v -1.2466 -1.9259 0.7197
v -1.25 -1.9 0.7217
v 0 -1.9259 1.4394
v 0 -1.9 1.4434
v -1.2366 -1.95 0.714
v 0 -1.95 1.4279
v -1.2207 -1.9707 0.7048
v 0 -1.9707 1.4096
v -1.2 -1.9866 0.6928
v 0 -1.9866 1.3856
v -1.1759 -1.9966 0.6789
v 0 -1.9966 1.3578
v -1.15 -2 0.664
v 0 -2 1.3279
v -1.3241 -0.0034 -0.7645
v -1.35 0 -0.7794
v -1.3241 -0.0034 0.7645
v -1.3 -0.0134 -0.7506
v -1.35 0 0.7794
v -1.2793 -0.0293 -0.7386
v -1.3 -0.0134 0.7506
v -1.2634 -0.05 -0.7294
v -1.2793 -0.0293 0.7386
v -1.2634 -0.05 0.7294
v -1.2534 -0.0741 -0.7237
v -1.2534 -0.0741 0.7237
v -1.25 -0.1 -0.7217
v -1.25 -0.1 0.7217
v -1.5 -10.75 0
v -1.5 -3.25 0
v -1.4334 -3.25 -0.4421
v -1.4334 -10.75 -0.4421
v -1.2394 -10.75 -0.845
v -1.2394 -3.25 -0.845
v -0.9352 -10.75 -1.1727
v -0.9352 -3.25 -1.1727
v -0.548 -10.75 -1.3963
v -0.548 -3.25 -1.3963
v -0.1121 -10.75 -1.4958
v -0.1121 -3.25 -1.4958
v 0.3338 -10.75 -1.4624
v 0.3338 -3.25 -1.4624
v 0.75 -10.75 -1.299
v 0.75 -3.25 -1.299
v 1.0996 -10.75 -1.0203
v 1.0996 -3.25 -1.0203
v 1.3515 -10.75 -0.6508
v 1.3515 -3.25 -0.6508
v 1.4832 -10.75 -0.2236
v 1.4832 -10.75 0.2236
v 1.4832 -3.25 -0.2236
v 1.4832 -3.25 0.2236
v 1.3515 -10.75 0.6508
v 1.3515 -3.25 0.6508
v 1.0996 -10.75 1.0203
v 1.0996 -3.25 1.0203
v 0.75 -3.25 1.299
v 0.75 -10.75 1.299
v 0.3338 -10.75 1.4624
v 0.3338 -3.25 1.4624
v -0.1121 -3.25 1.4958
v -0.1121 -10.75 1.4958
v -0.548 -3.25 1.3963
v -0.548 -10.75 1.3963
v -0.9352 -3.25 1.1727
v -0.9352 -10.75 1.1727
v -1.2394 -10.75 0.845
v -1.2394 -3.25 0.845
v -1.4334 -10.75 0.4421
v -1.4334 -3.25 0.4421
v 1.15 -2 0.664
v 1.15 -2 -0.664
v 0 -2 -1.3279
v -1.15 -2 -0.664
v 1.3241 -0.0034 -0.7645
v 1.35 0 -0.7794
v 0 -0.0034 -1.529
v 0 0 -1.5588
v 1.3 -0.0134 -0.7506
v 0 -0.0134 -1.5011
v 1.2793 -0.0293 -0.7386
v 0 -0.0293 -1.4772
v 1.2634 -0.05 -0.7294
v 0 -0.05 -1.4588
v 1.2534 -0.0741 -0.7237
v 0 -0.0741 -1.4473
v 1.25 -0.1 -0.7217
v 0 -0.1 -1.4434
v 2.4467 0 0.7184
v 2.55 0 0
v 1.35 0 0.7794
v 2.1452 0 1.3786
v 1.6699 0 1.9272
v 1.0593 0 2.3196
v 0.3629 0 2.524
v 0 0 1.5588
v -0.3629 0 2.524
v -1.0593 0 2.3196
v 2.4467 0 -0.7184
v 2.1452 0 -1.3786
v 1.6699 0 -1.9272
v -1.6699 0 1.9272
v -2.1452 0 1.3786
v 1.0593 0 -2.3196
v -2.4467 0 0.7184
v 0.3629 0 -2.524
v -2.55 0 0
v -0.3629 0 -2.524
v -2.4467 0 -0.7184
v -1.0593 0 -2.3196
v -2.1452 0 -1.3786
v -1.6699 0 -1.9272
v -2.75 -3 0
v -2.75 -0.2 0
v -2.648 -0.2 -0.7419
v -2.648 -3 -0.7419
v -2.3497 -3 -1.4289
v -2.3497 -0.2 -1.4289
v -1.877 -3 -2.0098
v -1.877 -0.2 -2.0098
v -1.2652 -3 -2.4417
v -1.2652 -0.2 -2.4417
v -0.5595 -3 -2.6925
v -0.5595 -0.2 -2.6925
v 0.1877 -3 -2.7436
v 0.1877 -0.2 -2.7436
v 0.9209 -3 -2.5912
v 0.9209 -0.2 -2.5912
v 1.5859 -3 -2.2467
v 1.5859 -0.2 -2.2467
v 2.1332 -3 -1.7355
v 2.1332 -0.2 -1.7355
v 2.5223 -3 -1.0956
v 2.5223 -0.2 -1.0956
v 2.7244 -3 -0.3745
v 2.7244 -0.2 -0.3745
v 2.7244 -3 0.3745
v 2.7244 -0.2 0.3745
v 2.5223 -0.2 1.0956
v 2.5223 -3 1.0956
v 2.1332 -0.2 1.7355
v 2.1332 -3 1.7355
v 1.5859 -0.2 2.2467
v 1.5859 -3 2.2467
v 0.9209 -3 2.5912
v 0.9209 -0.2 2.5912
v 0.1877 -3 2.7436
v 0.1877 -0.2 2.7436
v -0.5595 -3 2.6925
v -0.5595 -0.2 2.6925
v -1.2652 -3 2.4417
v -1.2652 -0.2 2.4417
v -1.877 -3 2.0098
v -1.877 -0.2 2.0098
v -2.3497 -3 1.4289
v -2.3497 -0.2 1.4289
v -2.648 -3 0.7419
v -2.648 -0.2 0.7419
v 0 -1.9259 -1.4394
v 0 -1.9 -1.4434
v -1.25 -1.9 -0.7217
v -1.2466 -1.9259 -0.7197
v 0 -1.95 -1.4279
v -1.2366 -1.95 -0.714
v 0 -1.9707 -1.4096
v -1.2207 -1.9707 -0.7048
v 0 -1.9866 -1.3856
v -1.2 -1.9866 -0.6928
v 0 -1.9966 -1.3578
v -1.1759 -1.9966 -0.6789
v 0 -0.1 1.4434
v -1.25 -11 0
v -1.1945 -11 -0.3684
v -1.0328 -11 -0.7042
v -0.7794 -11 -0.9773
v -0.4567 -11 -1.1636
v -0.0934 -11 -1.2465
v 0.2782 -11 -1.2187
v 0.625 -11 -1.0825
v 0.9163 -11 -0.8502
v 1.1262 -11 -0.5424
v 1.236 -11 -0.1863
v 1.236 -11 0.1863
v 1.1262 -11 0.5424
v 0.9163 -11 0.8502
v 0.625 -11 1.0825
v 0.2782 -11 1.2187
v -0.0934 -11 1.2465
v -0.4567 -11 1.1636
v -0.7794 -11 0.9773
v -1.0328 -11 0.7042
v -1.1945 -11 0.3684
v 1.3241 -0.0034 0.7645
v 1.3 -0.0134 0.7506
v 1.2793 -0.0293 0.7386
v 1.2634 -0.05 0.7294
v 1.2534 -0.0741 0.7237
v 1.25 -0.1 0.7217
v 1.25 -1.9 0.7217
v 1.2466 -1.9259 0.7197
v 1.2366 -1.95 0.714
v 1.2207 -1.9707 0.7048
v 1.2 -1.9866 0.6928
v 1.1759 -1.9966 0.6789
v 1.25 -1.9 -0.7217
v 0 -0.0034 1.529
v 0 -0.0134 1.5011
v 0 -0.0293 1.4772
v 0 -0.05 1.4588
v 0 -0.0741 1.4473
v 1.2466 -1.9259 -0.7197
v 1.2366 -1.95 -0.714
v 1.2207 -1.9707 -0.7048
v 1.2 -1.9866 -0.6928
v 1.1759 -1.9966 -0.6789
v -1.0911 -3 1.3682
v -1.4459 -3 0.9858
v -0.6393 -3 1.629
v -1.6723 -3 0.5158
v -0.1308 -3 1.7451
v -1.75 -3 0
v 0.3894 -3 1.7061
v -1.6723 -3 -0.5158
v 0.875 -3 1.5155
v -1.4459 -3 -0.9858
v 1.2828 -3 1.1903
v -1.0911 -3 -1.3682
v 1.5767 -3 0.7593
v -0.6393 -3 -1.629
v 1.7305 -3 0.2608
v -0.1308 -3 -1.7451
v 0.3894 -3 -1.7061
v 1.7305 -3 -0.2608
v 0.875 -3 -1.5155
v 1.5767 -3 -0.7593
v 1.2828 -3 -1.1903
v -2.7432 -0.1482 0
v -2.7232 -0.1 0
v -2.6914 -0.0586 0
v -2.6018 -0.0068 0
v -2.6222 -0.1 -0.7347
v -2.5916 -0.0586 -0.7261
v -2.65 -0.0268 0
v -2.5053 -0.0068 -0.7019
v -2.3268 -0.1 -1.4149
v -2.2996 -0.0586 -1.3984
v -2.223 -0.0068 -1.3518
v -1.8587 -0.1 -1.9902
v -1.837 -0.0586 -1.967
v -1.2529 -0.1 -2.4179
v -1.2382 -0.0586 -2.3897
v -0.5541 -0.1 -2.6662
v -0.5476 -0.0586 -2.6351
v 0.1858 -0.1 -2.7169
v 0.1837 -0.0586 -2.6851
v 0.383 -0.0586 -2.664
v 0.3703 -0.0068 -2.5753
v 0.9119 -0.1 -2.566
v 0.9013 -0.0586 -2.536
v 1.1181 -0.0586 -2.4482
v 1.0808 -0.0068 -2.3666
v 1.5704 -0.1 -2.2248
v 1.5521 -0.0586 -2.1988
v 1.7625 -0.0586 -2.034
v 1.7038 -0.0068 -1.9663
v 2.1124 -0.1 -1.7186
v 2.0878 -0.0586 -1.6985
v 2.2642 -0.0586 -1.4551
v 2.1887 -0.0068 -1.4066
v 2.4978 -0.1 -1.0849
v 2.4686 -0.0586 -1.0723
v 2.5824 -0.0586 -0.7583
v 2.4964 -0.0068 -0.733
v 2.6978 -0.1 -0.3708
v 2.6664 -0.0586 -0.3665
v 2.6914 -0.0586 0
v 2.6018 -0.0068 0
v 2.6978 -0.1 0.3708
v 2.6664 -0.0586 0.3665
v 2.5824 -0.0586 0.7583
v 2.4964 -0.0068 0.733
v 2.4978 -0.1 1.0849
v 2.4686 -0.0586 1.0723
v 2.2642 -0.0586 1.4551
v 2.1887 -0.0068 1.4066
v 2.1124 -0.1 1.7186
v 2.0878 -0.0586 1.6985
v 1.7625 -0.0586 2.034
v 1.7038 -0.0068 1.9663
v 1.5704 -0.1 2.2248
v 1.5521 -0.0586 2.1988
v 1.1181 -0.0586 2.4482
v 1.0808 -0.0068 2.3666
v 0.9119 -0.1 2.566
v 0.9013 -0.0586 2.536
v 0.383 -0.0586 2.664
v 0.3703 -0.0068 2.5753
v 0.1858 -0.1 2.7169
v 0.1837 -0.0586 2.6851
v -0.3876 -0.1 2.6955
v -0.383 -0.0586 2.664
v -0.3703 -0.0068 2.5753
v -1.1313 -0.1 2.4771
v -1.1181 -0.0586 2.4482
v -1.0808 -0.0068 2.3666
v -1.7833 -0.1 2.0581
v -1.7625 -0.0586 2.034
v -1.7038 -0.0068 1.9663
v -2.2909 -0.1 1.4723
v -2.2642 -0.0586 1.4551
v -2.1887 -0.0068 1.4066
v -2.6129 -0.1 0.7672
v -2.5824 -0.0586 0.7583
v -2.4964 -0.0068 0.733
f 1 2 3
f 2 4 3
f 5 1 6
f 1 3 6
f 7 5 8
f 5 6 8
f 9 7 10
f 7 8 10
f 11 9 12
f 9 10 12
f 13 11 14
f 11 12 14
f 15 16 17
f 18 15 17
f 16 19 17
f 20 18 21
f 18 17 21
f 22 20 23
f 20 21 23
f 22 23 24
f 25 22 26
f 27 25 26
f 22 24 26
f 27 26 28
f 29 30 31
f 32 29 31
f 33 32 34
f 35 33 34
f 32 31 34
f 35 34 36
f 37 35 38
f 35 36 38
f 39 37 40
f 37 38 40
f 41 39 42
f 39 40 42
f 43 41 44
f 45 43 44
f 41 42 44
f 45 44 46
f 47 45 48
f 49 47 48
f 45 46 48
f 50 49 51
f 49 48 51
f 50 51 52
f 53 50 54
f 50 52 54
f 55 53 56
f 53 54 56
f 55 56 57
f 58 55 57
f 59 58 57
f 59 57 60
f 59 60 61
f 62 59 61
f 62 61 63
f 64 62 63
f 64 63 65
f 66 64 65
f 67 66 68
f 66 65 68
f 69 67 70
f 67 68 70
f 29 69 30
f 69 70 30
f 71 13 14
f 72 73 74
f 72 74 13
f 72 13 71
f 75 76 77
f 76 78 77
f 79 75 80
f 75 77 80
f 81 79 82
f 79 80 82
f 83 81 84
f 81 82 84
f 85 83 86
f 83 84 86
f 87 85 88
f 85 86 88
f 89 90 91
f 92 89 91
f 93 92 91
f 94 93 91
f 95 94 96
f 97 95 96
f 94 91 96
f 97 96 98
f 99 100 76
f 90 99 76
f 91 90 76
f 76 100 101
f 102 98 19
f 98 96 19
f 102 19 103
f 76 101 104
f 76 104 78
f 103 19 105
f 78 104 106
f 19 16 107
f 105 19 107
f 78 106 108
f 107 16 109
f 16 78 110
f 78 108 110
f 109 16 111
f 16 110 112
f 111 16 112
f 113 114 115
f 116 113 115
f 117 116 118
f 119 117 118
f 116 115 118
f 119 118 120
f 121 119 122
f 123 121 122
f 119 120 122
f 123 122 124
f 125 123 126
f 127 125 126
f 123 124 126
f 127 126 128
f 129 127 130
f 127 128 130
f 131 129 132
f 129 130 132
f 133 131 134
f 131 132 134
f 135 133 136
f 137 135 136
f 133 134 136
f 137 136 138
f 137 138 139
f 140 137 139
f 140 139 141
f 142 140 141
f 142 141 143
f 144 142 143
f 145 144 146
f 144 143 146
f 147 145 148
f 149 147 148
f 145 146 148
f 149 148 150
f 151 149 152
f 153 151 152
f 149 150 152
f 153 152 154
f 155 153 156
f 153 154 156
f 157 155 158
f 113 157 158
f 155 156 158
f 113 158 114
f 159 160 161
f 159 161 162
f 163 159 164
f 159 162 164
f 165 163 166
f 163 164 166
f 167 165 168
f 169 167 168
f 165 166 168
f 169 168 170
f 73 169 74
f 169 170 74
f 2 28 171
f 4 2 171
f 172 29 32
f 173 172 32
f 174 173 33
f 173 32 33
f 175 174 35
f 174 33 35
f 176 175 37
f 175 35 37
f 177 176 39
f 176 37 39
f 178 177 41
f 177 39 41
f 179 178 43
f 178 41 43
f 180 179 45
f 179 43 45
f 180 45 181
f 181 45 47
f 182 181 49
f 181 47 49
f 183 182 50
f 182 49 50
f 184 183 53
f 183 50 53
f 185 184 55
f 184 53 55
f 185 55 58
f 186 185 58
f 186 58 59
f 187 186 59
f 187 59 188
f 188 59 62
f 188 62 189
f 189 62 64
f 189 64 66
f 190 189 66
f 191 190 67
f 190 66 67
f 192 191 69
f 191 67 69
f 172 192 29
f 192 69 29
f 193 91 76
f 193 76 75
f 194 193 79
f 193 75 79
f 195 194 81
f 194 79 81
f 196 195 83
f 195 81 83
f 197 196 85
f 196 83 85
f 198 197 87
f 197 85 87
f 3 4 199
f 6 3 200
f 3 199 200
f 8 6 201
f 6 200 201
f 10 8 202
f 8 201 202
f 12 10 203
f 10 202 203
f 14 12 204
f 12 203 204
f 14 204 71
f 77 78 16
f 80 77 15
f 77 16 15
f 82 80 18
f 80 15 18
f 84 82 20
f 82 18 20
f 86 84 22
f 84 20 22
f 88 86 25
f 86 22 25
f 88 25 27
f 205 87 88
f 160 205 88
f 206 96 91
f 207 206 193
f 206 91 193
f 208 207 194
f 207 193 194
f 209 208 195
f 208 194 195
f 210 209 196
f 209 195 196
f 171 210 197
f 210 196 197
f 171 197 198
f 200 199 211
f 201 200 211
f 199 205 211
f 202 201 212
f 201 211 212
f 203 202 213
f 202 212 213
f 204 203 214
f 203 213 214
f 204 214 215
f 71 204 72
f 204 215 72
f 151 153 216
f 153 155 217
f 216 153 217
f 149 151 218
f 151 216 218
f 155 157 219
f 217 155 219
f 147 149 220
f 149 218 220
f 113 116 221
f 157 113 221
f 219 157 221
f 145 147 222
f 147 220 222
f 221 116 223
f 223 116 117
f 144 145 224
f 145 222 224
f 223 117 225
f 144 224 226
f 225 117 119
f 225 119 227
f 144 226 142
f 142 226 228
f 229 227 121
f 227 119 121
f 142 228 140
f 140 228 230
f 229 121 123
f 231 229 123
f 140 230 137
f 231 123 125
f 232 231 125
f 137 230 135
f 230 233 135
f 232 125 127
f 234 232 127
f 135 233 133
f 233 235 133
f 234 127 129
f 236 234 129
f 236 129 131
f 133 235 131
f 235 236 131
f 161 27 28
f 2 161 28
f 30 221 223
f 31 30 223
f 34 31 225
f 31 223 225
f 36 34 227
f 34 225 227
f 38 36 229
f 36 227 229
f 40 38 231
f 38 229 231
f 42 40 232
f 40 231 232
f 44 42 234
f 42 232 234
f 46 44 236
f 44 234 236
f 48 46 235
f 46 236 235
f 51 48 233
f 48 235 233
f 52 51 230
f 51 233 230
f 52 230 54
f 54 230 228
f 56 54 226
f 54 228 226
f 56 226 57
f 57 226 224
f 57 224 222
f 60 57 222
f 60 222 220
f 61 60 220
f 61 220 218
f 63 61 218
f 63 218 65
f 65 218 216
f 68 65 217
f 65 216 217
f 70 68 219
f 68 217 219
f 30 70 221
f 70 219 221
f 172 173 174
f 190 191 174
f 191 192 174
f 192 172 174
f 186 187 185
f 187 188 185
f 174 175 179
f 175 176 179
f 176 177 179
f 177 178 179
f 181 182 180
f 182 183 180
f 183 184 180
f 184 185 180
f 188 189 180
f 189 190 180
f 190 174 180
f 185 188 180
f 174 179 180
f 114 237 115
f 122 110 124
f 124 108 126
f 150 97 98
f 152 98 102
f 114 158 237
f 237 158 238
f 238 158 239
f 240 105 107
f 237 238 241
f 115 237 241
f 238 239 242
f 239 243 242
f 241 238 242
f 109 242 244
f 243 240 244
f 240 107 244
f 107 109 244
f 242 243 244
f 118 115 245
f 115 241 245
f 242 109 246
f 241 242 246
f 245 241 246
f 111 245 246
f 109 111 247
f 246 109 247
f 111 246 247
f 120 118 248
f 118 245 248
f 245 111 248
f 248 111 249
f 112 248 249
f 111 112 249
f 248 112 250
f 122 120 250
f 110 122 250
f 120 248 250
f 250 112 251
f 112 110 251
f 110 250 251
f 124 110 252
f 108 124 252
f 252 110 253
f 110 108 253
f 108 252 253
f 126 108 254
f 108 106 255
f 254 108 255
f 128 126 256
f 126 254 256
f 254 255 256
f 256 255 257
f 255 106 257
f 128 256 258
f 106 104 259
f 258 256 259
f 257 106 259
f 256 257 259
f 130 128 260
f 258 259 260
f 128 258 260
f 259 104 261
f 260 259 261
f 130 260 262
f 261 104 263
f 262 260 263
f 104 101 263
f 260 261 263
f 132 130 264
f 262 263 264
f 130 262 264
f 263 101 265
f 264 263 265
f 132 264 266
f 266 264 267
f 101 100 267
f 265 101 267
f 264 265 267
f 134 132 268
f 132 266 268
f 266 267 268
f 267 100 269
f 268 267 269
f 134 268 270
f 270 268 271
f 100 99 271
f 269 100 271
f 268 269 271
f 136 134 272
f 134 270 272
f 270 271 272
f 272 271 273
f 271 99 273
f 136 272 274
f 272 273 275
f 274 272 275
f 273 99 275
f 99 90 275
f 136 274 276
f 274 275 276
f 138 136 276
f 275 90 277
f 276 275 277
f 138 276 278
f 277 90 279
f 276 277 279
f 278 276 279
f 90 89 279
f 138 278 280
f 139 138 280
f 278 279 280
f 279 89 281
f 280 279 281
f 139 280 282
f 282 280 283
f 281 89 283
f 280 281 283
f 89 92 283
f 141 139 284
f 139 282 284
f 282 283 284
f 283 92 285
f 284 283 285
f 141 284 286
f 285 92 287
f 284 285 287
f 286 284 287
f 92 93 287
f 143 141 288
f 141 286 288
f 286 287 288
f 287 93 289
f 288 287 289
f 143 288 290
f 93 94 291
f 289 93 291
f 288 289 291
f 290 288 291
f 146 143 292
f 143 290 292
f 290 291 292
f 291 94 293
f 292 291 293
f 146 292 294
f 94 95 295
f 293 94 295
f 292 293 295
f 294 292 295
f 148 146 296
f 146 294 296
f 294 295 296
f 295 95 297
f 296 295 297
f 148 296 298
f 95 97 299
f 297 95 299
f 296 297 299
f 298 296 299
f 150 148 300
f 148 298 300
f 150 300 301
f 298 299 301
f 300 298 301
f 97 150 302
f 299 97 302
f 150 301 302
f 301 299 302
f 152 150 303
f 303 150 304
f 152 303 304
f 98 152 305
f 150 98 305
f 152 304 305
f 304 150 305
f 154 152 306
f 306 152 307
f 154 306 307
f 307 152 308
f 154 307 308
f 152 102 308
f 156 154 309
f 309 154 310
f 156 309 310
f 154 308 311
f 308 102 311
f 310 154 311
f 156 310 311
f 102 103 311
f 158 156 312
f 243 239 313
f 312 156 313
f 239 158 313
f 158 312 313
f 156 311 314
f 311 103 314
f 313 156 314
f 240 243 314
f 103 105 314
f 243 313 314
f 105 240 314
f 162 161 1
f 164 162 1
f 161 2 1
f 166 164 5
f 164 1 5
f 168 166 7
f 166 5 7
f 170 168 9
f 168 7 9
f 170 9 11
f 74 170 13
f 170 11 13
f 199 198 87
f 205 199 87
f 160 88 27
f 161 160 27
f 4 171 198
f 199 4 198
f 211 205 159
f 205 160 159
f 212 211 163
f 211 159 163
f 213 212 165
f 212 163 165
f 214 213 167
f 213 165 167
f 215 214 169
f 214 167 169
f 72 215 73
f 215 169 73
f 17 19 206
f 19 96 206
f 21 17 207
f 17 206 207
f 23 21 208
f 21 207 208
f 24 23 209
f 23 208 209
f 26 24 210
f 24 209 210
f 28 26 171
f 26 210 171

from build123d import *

# Parameters (mm, degrees)
CHAMFER1_SIZE      = 0.25
FILLET1_R          = 0.2
CUT_EXTRUDE1_DEPTH = 2
FILLET2_R          = 0.1


with BuildPart() as part:
    # Sketch1 → Revolve1 (revolve)
    with BuildSketch(Plane.XY):
        Polygon((0, -11), (-1.5, -11), (-1.5, -3), (-2.75, -3), (-2.75, 0), (0, 0), align=None)
    revolve(axis=Axis((0, 0, 0), (0, -1, 0)))

    # Chamfer1
    chamfer1_edges = [part.edges().sort_by_distance(p)[0] for p in [
        (1.5, -3, 0),
        (1.5, -11, 0),
    ]]
    chamfer(chamfer1_edges, length=CHAMFER1_SIZE)

    # Fillet1
    fillet1_edges = [part.edges().sort_by_distance(p)[0] for p in [
        (2.75, 0, 0),
    ]]
    fillet(fillet1_edges, radius=FILLET1_R)

    # Sketch2 → Cut-Extrude1 (cut)
    with BuildSketch(Plane(origin=(0, 0, 0), x_dir=(1, 0, 0), z_dir=(0, 1, 0))):
        Polygon((0, 1.443375673), (-1.25, 0.721687836), (-1.25, -0.721687836), (0, -1.443375673), (1.25, -0.721687836), (1.25, 0.721687836), align=None)
    extrude(amount=-CUT_EXTRUDE1_DEPTH, mode=Mode.SUBTRACT)

    # Fillet2
    fillet2_edges = [part.edges().sort_by_distance(p)[0] for p in [
        (0.625, -2, -1.082531755),
        (1.25, -2, 0),
        (0.625, -2, 1.082531755),
        (-0.625, -2, 1.082531755),
        (-1.25, -2, 0),
        (-0.625, -2, -1.082531755),
        (0.625, 0, -1.082531755),
        (-0.625, 0, -1.082531755),
        (-1.25, 0, 0),
        (-0.625, 0, 1.082531755),
        (0.625, 0, 1.082531755),
        (1.25, 0, 0),
    ]]
    fillet(fillet2_edges, radius=FILLET2_R)


solid = part.part
